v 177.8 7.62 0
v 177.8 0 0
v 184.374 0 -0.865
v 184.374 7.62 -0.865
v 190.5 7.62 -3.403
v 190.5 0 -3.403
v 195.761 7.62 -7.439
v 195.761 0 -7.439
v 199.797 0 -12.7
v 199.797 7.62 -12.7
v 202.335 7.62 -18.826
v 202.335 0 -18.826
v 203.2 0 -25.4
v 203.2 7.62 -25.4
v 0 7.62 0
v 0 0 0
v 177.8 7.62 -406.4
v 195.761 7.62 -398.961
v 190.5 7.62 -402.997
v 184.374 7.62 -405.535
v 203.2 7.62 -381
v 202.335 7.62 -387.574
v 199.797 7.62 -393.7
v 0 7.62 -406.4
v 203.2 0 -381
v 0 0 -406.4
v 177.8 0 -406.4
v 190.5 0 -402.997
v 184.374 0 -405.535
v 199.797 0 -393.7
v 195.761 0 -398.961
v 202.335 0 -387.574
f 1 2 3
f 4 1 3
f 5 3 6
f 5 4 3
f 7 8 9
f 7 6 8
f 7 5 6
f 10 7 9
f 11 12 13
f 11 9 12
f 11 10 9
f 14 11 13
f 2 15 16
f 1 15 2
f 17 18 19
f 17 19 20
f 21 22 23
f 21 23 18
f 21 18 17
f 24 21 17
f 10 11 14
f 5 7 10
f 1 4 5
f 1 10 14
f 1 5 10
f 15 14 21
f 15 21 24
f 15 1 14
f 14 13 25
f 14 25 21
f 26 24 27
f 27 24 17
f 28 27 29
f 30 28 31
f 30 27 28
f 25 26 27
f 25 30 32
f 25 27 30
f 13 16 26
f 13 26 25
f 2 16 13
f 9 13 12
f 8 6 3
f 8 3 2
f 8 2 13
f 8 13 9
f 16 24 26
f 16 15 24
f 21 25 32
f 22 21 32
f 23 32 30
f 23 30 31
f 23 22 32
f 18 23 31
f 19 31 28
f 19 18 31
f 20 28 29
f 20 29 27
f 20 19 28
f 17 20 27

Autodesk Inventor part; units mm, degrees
ref_plane "YZ Plane" through (0, 0, 0) normal (1, 0, 0) x (0, 1, 0)
ref_plane "XZ Plane" through (0, 0, 0) normal (0, 1, 0) x (-1, 0, 0)
ref_plane "XY Plane" through (0, 0, 0) normal (0, 0, 1) x (1, 0, 0)
sketch "Sketch1" plane through (0, 0, 0) normal (0, 0, 1) x (1, 0, 0)
  line L0 (0, 0) -> (203.2, 0)
  line L1 (203.2, 0) -> (203.2, 7.62)
  line L2 (203.2, 7.62) -> (0, 7.62)
  line L3 (0, 7.62) -> (0, 0)
  dimension "d0" = 7.62
  dimension "d1" = 203.2
extrude "Extrusion1" add sketch "Sketch1" against normal blind 406.4
fillet "Fillet1" radius 25.4 2 edges at (203.2, 3.81, 0) (203.2, 3.81, -406.4)
properties part number "slab"
